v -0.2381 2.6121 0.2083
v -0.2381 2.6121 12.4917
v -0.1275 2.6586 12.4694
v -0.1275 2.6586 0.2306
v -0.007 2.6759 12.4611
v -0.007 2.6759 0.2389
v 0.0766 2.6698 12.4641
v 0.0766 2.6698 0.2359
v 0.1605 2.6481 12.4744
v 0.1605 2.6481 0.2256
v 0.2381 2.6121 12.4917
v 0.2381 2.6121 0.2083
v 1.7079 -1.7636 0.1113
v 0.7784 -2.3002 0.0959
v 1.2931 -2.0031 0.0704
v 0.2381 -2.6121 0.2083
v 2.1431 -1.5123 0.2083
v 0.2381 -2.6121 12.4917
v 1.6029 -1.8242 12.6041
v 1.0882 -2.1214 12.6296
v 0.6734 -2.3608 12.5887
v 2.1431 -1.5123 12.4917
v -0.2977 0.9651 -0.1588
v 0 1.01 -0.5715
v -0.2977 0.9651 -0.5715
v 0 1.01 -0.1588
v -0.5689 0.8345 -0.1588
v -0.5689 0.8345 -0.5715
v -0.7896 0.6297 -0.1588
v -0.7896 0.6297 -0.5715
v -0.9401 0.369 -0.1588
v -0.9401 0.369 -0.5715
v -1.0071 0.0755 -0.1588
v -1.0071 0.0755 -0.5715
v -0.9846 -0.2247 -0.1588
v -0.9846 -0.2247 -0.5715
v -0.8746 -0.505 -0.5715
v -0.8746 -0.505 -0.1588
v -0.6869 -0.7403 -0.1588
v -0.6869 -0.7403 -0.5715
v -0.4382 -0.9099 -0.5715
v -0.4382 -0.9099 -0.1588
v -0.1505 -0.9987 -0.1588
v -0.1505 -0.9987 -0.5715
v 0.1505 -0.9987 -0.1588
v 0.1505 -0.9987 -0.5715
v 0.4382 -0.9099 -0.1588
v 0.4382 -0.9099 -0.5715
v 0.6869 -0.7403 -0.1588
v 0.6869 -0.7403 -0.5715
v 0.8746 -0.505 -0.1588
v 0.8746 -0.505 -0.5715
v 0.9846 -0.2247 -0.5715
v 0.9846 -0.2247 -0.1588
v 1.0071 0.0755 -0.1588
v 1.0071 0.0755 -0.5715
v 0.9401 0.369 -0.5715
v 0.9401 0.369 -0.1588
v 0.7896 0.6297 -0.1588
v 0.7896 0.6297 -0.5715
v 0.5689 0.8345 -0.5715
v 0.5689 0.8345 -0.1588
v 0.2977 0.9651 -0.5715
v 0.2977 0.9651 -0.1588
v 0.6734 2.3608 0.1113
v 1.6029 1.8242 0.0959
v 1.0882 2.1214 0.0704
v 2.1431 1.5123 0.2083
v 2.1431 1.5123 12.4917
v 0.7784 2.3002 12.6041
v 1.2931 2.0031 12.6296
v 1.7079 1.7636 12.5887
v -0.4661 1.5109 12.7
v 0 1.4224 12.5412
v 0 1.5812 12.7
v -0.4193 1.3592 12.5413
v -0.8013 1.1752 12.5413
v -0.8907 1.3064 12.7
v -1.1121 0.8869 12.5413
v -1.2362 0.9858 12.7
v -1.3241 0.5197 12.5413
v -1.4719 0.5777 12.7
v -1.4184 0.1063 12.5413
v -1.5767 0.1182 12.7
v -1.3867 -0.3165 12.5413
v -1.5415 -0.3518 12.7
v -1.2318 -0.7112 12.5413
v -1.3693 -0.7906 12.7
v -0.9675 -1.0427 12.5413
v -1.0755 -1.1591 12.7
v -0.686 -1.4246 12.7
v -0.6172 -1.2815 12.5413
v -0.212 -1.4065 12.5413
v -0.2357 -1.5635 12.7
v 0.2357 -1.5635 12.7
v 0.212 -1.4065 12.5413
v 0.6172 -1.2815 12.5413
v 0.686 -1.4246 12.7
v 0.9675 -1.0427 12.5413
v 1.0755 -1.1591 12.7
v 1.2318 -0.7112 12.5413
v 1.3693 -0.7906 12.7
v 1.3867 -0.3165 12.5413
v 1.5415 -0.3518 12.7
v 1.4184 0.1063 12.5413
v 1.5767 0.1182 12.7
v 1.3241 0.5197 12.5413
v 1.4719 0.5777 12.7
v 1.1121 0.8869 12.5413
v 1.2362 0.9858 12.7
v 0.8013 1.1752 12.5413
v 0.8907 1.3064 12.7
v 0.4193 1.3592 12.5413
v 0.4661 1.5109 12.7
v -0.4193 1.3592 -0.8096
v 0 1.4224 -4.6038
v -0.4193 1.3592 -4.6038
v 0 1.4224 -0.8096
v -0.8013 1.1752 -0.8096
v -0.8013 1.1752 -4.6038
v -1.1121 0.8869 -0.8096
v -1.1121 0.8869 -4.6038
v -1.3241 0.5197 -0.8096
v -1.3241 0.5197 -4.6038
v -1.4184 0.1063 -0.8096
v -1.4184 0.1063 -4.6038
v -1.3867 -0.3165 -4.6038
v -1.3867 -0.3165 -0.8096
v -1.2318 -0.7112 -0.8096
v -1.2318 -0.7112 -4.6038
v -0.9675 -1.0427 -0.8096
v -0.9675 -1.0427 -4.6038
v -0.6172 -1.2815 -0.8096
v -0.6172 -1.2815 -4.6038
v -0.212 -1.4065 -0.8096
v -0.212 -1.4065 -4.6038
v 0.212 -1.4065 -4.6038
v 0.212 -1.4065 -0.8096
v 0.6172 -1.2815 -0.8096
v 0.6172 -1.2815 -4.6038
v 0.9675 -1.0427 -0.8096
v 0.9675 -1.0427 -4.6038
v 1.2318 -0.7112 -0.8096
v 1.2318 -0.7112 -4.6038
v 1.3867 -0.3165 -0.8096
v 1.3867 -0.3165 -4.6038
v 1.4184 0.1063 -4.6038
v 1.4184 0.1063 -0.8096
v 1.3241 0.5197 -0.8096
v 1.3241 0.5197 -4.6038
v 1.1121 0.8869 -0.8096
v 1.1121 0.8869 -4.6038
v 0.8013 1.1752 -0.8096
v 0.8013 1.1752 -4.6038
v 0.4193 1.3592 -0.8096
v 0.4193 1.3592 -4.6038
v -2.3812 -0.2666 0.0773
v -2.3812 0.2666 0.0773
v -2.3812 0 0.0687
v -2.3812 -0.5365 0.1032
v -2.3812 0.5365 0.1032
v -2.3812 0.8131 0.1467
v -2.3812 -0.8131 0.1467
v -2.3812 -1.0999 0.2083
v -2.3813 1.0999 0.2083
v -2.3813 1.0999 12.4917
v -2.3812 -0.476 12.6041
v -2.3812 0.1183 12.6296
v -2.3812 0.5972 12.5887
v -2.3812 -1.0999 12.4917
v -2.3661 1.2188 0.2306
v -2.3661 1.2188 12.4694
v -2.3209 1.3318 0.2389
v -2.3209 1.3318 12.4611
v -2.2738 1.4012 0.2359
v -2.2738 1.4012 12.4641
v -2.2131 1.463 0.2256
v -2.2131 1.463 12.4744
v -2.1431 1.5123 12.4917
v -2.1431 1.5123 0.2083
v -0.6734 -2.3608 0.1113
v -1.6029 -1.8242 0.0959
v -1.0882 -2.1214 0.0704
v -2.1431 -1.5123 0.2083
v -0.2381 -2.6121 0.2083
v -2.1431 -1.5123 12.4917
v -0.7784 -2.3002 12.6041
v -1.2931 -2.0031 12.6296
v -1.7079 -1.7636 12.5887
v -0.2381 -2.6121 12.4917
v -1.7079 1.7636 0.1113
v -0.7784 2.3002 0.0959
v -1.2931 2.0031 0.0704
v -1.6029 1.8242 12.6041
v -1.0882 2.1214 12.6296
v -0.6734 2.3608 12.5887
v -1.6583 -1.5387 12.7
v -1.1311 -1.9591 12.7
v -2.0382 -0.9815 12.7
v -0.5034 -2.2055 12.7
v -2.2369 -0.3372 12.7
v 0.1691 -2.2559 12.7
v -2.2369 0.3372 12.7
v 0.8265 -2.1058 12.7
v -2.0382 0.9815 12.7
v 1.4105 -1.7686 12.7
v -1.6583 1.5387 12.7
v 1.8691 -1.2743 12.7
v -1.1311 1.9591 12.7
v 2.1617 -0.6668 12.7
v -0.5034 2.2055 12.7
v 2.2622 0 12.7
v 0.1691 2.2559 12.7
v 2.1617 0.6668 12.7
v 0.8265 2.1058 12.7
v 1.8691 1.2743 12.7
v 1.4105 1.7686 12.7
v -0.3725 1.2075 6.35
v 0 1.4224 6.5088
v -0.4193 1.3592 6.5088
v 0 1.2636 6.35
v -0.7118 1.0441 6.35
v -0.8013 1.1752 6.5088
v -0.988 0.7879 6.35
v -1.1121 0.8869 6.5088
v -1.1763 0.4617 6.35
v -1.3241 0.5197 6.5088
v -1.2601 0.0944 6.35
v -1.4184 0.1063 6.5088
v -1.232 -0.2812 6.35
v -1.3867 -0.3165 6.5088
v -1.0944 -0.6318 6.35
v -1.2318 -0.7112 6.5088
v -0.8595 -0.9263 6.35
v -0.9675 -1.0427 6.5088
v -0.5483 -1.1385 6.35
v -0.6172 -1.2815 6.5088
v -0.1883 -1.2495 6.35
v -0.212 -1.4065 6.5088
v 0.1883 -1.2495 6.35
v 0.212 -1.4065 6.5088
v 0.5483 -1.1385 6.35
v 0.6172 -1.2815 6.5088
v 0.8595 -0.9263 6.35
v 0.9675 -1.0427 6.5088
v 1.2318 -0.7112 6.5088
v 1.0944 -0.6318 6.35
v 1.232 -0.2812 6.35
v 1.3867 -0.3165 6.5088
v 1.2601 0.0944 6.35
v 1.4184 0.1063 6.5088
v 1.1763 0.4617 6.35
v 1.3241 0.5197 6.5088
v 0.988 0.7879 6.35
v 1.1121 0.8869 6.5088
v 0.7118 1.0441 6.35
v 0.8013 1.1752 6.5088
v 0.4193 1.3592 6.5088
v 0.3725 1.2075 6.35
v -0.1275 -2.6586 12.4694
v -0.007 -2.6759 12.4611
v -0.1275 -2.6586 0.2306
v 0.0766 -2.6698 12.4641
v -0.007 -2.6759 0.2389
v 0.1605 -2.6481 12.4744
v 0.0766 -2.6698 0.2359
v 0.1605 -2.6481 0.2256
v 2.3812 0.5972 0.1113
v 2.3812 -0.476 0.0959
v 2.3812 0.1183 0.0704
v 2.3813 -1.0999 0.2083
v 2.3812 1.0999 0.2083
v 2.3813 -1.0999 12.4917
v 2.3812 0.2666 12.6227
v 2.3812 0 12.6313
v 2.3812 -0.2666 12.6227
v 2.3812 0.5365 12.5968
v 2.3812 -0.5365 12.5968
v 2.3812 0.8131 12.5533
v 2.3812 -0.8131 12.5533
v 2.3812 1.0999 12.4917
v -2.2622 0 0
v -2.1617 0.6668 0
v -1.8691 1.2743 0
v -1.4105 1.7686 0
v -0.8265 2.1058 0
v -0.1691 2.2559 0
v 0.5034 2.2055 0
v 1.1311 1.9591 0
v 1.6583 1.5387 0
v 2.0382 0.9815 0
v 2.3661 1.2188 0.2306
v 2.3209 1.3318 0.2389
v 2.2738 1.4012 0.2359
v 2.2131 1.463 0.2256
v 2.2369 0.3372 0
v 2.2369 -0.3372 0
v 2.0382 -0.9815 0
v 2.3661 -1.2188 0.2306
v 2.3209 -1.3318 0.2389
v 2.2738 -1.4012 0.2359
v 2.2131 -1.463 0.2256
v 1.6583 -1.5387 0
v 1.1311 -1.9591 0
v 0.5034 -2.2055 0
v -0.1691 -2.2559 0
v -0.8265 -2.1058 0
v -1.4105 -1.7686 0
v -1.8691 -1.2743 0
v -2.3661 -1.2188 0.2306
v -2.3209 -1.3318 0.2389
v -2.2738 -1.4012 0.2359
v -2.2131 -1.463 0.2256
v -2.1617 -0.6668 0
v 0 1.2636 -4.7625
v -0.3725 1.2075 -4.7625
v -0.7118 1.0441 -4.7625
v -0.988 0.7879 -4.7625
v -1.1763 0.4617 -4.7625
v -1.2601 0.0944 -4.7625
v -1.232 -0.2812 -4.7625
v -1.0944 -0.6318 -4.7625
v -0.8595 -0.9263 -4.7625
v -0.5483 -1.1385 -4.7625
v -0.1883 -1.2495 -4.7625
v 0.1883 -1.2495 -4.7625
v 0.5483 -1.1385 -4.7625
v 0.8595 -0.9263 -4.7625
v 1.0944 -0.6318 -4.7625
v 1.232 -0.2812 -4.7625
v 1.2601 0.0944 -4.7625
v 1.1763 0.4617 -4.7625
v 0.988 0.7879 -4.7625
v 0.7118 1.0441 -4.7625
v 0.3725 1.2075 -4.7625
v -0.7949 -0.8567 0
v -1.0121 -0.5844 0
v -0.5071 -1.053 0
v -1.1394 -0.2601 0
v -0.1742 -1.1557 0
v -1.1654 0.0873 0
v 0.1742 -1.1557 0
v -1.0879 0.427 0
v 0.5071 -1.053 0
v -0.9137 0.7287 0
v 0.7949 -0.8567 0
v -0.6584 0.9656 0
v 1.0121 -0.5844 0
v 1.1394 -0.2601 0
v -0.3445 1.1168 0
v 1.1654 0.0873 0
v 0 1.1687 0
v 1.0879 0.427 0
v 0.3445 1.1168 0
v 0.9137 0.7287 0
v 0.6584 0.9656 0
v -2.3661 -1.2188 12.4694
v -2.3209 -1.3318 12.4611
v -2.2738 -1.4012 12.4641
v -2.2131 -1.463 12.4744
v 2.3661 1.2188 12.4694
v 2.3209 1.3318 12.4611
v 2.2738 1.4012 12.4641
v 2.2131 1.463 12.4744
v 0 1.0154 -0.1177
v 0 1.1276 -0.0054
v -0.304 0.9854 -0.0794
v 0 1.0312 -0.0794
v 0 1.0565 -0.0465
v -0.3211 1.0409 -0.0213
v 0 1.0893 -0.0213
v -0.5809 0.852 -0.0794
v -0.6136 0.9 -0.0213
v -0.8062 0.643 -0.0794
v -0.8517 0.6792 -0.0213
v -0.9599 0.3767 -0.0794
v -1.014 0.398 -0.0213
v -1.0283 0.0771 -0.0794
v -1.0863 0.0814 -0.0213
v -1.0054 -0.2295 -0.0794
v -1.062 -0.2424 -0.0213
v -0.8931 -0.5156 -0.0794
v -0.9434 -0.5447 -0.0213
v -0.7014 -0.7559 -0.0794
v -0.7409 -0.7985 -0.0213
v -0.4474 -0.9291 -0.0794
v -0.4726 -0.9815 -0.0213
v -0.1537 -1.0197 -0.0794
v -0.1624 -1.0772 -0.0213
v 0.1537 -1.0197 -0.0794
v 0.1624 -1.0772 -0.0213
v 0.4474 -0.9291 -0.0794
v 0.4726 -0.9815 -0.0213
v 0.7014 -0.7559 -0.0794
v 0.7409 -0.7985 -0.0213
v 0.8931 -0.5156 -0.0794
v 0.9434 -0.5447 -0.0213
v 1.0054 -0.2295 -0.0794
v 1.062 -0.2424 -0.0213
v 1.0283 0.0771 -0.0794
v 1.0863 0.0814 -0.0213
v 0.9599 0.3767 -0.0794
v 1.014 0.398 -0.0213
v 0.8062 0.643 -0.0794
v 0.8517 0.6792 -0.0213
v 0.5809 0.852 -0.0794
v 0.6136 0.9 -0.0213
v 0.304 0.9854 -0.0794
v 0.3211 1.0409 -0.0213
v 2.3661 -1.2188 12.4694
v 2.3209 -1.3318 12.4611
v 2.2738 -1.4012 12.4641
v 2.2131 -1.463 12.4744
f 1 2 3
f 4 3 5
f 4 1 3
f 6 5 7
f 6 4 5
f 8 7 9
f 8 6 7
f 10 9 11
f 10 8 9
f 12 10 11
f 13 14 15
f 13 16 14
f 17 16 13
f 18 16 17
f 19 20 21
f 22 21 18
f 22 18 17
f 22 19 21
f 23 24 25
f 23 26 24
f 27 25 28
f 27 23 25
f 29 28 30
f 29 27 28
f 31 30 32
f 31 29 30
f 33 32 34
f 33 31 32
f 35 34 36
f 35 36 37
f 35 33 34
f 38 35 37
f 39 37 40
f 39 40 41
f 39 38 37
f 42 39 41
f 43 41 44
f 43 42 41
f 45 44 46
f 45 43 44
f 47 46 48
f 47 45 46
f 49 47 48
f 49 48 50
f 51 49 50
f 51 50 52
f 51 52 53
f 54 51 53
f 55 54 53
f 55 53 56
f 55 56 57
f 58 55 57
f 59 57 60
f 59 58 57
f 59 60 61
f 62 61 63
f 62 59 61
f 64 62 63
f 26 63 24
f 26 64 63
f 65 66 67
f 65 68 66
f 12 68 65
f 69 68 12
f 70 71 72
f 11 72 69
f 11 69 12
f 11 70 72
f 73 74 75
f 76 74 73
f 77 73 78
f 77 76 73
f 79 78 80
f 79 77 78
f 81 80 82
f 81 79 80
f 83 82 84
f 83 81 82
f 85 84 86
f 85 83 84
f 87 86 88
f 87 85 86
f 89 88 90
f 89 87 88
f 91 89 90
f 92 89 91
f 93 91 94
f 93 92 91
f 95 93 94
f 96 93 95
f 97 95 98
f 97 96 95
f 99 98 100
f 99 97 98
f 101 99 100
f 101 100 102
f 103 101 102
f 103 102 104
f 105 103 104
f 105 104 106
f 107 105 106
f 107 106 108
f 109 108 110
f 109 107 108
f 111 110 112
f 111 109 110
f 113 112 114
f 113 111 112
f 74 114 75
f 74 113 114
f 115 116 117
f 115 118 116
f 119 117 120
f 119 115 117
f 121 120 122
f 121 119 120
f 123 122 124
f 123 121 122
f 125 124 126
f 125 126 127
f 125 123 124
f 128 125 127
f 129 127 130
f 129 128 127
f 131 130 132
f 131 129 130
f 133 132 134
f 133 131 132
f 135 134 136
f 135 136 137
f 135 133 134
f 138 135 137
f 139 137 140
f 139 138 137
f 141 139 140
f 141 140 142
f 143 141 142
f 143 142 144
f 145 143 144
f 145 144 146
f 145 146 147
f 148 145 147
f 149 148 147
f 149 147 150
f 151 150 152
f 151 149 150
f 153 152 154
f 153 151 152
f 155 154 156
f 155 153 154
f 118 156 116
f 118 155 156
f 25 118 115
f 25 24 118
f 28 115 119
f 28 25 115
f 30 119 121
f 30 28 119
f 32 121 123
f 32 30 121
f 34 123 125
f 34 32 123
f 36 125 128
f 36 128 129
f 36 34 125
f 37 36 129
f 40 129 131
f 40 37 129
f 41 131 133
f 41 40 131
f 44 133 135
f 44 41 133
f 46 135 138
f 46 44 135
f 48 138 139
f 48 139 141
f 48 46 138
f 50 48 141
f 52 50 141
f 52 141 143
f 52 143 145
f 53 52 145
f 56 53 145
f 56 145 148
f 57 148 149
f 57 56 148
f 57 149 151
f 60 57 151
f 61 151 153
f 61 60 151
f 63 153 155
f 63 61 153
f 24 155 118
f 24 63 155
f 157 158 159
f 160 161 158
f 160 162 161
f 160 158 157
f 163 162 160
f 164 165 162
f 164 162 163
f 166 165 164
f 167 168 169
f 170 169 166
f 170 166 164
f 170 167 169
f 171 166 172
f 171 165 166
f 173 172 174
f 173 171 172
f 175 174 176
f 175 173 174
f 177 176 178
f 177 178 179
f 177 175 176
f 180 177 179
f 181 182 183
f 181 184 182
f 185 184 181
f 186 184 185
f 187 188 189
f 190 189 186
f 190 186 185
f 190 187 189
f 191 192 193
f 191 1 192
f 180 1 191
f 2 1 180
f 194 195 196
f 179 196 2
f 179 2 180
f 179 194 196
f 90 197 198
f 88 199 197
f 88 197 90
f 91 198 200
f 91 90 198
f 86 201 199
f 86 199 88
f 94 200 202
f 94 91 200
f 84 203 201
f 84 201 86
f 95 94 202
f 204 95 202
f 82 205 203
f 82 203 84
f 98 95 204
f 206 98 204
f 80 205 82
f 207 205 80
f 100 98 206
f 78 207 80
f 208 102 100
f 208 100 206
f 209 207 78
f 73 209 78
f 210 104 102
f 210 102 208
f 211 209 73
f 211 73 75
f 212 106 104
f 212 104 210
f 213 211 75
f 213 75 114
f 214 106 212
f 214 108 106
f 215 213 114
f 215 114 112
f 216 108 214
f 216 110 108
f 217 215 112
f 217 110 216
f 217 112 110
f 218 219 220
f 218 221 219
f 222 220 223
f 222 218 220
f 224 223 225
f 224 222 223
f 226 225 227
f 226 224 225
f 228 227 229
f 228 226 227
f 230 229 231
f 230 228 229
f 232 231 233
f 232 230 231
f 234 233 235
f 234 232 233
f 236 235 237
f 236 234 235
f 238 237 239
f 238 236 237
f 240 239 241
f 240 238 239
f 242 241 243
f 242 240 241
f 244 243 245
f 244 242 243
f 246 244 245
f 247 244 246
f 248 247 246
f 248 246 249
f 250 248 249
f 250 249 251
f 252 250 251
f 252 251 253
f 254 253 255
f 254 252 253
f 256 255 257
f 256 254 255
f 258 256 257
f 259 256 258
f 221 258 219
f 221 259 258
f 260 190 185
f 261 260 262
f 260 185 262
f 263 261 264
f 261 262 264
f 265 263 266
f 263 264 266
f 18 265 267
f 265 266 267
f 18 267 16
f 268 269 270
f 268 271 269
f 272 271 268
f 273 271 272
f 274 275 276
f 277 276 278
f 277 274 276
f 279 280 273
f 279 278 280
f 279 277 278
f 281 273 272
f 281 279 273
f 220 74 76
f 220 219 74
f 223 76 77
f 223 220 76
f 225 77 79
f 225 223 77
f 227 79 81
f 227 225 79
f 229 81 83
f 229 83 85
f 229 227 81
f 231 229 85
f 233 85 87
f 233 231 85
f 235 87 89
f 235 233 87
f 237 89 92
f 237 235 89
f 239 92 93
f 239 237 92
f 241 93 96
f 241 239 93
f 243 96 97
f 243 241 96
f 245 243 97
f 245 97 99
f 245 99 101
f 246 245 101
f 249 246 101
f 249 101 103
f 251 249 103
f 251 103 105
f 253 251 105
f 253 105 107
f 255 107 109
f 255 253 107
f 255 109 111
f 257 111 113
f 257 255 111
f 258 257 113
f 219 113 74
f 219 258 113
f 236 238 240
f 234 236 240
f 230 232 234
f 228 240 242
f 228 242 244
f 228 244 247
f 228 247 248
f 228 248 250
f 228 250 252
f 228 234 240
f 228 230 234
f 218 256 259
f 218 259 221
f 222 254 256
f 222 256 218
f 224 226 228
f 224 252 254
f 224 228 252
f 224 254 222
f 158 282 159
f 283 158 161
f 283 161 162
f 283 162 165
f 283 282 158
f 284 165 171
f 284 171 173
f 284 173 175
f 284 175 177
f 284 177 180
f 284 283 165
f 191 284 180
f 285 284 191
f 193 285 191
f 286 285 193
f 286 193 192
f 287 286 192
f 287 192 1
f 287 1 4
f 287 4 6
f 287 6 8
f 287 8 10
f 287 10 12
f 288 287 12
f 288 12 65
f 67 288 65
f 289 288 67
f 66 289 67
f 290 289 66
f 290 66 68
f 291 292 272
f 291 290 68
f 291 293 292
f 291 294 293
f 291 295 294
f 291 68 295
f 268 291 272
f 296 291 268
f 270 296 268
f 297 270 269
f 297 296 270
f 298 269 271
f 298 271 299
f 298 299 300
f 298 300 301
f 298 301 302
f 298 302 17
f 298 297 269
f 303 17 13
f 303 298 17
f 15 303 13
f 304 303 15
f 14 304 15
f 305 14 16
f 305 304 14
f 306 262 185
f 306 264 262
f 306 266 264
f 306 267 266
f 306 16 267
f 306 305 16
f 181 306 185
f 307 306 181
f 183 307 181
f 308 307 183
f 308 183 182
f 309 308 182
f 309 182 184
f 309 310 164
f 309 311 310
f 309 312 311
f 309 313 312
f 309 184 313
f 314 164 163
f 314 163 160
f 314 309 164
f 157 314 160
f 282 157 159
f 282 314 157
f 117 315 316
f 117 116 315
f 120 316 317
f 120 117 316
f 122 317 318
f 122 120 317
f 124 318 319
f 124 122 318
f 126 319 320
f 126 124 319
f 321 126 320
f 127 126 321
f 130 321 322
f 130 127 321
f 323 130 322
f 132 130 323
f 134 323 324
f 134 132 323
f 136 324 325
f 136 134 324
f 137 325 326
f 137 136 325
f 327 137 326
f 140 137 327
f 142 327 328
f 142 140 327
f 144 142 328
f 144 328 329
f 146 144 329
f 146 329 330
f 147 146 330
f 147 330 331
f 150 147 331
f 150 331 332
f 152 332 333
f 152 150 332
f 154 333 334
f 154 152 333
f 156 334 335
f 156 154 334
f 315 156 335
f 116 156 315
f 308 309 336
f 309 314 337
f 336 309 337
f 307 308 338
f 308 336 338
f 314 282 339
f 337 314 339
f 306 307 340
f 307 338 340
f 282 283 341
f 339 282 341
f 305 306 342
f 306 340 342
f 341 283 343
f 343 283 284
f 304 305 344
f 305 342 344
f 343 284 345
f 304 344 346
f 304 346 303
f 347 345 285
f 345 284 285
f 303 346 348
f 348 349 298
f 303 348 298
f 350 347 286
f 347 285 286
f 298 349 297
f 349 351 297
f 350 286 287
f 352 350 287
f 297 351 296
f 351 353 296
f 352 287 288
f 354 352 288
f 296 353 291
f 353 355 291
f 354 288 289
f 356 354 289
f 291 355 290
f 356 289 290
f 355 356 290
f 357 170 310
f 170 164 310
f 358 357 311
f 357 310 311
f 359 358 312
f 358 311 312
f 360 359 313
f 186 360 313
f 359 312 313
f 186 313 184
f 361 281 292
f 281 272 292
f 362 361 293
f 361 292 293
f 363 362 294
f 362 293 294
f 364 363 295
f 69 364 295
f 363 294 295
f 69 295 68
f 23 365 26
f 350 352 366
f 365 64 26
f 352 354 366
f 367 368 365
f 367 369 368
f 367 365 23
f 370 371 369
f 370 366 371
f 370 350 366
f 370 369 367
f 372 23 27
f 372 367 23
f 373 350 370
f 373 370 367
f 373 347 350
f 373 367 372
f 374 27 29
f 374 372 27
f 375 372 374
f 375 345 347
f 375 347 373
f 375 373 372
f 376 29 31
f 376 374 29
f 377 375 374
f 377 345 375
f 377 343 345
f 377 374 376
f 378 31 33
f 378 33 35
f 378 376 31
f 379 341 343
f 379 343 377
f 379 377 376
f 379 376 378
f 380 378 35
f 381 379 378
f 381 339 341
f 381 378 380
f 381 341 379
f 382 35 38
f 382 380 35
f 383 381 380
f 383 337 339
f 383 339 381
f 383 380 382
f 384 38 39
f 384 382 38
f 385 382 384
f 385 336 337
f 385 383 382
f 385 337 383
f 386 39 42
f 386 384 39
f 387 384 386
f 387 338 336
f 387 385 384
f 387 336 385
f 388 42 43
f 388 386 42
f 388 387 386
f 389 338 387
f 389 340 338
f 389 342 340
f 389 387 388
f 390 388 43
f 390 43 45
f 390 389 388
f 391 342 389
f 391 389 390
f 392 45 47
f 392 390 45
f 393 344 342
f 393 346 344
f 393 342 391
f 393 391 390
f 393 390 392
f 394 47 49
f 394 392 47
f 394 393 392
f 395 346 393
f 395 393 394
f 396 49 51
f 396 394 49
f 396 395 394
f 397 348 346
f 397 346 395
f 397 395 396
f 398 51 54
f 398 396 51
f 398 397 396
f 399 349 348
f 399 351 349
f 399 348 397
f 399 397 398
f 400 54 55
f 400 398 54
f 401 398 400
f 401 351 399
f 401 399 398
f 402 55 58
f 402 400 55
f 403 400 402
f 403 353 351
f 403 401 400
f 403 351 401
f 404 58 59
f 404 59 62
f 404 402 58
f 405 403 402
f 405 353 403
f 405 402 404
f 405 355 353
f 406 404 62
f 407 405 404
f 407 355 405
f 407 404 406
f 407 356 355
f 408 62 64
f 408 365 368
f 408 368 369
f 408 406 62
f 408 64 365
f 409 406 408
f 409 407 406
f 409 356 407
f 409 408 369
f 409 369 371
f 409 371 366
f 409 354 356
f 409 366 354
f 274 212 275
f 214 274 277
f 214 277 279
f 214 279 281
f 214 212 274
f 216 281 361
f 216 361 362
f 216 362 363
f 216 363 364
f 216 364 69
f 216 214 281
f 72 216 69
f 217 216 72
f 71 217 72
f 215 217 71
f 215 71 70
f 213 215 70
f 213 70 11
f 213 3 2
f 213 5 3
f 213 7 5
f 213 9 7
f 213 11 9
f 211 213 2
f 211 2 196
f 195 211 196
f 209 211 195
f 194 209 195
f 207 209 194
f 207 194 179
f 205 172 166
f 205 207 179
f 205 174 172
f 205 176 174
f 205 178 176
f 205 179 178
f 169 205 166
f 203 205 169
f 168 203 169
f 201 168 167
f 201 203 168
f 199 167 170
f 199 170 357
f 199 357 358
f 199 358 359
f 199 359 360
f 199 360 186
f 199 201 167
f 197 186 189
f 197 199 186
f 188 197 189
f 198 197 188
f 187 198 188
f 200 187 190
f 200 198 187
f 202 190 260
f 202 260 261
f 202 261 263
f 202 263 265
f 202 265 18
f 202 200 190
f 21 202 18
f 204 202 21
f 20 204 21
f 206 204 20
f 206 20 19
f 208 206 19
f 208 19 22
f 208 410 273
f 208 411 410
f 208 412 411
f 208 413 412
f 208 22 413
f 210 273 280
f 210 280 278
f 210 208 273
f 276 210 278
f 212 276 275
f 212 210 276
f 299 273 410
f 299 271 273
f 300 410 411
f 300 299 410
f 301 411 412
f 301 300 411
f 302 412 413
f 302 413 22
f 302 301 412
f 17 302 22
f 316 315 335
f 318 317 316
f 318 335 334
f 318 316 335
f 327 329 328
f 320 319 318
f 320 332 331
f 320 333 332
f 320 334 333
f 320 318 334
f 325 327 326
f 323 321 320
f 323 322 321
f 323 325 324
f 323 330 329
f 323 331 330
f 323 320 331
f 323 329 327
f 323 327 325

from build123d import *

# Parameters (mm, degrees)
SKETCH4_R           = 1.901825
BOSS_EXTRUDE1_DEPTH = 12.7
SKETCH5_OUTSIDE_W   = 75.8
SKETCH5_OUTSIDE_H   = 76.538
SKETCH5_OUTSIDE_R   = 2.2621875
CUT_EXTRUDE1_DEPTH  = 18.837312762
CUT_EXTRUDE1_DRAFT  = -60
SKETCH6_OUTSIDE_W   = 59.772
SKETCH6_OUTSIDE_H   = 60.51
SKETCH6_OUTSIDE_R   = 2.2621875
CUT_EXTRUDE2_DEPTH  = 14.210632851
CUT_EXTRUDE2_DRAFT  = -60
FILLET1_R           = 0.47625


with BuildPart() as part:
    # Sketch3 → Revolve1 (revolve)
    with BuildSketch(Plane(origin=(0, 0, 0), x_dir=(0, 0, -1), z_dir=(1, 0, 0))):
        with BuildLine():
            Line((-6.35, 1.26365), (-6.35, 0))
            Line((-6.35, 0), (4.7625, 0))
            Line((4.7625, 0), (4.7625, 1.26365))
            Line((4.7625, 1.26365), (4.60375, 1.4224))
            Line((4.60375, 1.4224), (0.809625, 1.4224))
            Line((0.809625, 1.4224), (0.5715, 1.009955401))
            Line((0.5715, 1.009955401), (0.15875, 1.009955401))
            ThreePointArc((0.15875, 1.009955401), (0.046496798, 1.0564522), (0, 1.168705401))
            Line((0, 1.168705401), (0, 2.38125))
            Line((0, 2.38125), (-12.7, 2.38125))
            Line((-12.7, 2.38125), (-12.7, 1.58115))
            Line((-12.7, 1.58115), (-12.54125, 1.4224))
            Line((-12.54125, 1.4224), (-6.50875, 1.4224))
            Line((-6.50875, 1.4224), (-6.35, 1.26365))
        make_face()
    revolve(axis=Axis((0, 0, -4.7625), (0, 0, 1)))

    # Sketch4 → Boss-Extrude1 (add)
    with BuildSketch(Plane.XY.offset(12.7)):
        Polygon((-2.38125, 1.374815329), (-2.38125, -1.374815329), (0, -2.749630657), (2.38125, -1.374815329), (2.38125, 1.374815329), (0, 2.749630657), align=None)
        Circle(SKETCH4_R, mode=Mode.SUBTRACT)
    extrude(amount=-BOSS_EXTRUDE1_DEPTH)


with BuildPart() as cut_extrude1_tool:
    # Sketch5 outside → Cut-Extrude1 (with draft: the straight prism first)
    with BuildSketch(Plane.XY.offset(12.7)):
        Rectangle(SKETCH5_OUTSIDE_W, SKETCH5_OUTSIDE_H)
        Circle(SKETCH5_OUTSIDE_R, mode=Mode.SUBTRACT)
    extrude(amount=-CUT_EXTRUDE1_DEPTH)
    # Cut-Extrude1: the draft: its side faces are tilted about the plane it starts from
    cut_extrude1_sides = [cut_extrude1_tool.faces().sort_by_distance(p)[0] for p in [
        (0, -38.269, 3.281343619),
        (37.9, 0, 3.281343619),
        (0, 38.269, 3.281343619),
        (-37.9, 0, 3.281343619),
        (-2.2621875, 0, 3.281343619),
    ]]
    draft(cut_extrude1_sides, Plane.XY.offset(12.7), CUT_EXTRUDE1_DRAFT)


with BuildPart() as part_1:
    add(part.part)

    # Cut-Extrude1: cut by cut_extrude1_tool
    add(cut_extrude1_tool.part, mode=Mode.SUBTRACT)


with BuildPart() as cut_extrude2_tool:
    # Sketch6 outside → Cut-Extrude2 (with draft: the straight prism first)
    with BuildSketch(Plane(origin=(0, 0, 0), x_dir=(-1, 0, 0), z_dir=(0, 0, -1))):
        Rectangle(SKETCH6_OUTSIDE_W, SKETCH6_OUTSIDE_H)
        Circle(SKETCH6_OUTSIDE_R, mode=Mode.SUBTRACT)
    extrude(amount=-CUT_EXTRUDE2_DEPTH)
    # Cut-Extrude2: the draft: its side faces are tilted about the plane it starts from
    cut_extrude2_sides = [cut_extrude2_tool.faces().sort_by_distance(p)[0] for p in [
        (0, -30.255, 7.105316425),
        (-29.886, 0, 7.105316425),
        (0, 30.255, 7.105316425),
        (29.886, 0, 7.105316425),
        (2.2621875, 0, 7.105316425),
    ]]
    draft(cut_extrude2_sides, Plane(origin=(0, 0, 0), x_dir=(-1, 0, 0), z_dir=(0, 0, -1)), CUT_EXTRUDE2_DRAFT)


with BuildPart() as part_2:
    add(part_1.part)

    # Cut-Extrude2: cut by cut_extrude2_tool
    add(cut_extrude2_tool.part, mode=Mode.SUBTRACT)

    # Fillet1
    fillet1_edges = [part_2.edges().sort_by_distance(p)[0] for p in [
        (0, 2.749630657, 6.35),
        (-2.38125, -1.374815329, 6.35),
        (0, -2.749630657, 6.35),
        (2.38125, -1.374815329, 6.35),
        (2.38125, 1.374815329, 6.35),
        (-2.38125, 1.374815329, 6.35),
    ]]
    fillet(fillet1_edges, radius=FILLET1_R)


solid = part_2.part
